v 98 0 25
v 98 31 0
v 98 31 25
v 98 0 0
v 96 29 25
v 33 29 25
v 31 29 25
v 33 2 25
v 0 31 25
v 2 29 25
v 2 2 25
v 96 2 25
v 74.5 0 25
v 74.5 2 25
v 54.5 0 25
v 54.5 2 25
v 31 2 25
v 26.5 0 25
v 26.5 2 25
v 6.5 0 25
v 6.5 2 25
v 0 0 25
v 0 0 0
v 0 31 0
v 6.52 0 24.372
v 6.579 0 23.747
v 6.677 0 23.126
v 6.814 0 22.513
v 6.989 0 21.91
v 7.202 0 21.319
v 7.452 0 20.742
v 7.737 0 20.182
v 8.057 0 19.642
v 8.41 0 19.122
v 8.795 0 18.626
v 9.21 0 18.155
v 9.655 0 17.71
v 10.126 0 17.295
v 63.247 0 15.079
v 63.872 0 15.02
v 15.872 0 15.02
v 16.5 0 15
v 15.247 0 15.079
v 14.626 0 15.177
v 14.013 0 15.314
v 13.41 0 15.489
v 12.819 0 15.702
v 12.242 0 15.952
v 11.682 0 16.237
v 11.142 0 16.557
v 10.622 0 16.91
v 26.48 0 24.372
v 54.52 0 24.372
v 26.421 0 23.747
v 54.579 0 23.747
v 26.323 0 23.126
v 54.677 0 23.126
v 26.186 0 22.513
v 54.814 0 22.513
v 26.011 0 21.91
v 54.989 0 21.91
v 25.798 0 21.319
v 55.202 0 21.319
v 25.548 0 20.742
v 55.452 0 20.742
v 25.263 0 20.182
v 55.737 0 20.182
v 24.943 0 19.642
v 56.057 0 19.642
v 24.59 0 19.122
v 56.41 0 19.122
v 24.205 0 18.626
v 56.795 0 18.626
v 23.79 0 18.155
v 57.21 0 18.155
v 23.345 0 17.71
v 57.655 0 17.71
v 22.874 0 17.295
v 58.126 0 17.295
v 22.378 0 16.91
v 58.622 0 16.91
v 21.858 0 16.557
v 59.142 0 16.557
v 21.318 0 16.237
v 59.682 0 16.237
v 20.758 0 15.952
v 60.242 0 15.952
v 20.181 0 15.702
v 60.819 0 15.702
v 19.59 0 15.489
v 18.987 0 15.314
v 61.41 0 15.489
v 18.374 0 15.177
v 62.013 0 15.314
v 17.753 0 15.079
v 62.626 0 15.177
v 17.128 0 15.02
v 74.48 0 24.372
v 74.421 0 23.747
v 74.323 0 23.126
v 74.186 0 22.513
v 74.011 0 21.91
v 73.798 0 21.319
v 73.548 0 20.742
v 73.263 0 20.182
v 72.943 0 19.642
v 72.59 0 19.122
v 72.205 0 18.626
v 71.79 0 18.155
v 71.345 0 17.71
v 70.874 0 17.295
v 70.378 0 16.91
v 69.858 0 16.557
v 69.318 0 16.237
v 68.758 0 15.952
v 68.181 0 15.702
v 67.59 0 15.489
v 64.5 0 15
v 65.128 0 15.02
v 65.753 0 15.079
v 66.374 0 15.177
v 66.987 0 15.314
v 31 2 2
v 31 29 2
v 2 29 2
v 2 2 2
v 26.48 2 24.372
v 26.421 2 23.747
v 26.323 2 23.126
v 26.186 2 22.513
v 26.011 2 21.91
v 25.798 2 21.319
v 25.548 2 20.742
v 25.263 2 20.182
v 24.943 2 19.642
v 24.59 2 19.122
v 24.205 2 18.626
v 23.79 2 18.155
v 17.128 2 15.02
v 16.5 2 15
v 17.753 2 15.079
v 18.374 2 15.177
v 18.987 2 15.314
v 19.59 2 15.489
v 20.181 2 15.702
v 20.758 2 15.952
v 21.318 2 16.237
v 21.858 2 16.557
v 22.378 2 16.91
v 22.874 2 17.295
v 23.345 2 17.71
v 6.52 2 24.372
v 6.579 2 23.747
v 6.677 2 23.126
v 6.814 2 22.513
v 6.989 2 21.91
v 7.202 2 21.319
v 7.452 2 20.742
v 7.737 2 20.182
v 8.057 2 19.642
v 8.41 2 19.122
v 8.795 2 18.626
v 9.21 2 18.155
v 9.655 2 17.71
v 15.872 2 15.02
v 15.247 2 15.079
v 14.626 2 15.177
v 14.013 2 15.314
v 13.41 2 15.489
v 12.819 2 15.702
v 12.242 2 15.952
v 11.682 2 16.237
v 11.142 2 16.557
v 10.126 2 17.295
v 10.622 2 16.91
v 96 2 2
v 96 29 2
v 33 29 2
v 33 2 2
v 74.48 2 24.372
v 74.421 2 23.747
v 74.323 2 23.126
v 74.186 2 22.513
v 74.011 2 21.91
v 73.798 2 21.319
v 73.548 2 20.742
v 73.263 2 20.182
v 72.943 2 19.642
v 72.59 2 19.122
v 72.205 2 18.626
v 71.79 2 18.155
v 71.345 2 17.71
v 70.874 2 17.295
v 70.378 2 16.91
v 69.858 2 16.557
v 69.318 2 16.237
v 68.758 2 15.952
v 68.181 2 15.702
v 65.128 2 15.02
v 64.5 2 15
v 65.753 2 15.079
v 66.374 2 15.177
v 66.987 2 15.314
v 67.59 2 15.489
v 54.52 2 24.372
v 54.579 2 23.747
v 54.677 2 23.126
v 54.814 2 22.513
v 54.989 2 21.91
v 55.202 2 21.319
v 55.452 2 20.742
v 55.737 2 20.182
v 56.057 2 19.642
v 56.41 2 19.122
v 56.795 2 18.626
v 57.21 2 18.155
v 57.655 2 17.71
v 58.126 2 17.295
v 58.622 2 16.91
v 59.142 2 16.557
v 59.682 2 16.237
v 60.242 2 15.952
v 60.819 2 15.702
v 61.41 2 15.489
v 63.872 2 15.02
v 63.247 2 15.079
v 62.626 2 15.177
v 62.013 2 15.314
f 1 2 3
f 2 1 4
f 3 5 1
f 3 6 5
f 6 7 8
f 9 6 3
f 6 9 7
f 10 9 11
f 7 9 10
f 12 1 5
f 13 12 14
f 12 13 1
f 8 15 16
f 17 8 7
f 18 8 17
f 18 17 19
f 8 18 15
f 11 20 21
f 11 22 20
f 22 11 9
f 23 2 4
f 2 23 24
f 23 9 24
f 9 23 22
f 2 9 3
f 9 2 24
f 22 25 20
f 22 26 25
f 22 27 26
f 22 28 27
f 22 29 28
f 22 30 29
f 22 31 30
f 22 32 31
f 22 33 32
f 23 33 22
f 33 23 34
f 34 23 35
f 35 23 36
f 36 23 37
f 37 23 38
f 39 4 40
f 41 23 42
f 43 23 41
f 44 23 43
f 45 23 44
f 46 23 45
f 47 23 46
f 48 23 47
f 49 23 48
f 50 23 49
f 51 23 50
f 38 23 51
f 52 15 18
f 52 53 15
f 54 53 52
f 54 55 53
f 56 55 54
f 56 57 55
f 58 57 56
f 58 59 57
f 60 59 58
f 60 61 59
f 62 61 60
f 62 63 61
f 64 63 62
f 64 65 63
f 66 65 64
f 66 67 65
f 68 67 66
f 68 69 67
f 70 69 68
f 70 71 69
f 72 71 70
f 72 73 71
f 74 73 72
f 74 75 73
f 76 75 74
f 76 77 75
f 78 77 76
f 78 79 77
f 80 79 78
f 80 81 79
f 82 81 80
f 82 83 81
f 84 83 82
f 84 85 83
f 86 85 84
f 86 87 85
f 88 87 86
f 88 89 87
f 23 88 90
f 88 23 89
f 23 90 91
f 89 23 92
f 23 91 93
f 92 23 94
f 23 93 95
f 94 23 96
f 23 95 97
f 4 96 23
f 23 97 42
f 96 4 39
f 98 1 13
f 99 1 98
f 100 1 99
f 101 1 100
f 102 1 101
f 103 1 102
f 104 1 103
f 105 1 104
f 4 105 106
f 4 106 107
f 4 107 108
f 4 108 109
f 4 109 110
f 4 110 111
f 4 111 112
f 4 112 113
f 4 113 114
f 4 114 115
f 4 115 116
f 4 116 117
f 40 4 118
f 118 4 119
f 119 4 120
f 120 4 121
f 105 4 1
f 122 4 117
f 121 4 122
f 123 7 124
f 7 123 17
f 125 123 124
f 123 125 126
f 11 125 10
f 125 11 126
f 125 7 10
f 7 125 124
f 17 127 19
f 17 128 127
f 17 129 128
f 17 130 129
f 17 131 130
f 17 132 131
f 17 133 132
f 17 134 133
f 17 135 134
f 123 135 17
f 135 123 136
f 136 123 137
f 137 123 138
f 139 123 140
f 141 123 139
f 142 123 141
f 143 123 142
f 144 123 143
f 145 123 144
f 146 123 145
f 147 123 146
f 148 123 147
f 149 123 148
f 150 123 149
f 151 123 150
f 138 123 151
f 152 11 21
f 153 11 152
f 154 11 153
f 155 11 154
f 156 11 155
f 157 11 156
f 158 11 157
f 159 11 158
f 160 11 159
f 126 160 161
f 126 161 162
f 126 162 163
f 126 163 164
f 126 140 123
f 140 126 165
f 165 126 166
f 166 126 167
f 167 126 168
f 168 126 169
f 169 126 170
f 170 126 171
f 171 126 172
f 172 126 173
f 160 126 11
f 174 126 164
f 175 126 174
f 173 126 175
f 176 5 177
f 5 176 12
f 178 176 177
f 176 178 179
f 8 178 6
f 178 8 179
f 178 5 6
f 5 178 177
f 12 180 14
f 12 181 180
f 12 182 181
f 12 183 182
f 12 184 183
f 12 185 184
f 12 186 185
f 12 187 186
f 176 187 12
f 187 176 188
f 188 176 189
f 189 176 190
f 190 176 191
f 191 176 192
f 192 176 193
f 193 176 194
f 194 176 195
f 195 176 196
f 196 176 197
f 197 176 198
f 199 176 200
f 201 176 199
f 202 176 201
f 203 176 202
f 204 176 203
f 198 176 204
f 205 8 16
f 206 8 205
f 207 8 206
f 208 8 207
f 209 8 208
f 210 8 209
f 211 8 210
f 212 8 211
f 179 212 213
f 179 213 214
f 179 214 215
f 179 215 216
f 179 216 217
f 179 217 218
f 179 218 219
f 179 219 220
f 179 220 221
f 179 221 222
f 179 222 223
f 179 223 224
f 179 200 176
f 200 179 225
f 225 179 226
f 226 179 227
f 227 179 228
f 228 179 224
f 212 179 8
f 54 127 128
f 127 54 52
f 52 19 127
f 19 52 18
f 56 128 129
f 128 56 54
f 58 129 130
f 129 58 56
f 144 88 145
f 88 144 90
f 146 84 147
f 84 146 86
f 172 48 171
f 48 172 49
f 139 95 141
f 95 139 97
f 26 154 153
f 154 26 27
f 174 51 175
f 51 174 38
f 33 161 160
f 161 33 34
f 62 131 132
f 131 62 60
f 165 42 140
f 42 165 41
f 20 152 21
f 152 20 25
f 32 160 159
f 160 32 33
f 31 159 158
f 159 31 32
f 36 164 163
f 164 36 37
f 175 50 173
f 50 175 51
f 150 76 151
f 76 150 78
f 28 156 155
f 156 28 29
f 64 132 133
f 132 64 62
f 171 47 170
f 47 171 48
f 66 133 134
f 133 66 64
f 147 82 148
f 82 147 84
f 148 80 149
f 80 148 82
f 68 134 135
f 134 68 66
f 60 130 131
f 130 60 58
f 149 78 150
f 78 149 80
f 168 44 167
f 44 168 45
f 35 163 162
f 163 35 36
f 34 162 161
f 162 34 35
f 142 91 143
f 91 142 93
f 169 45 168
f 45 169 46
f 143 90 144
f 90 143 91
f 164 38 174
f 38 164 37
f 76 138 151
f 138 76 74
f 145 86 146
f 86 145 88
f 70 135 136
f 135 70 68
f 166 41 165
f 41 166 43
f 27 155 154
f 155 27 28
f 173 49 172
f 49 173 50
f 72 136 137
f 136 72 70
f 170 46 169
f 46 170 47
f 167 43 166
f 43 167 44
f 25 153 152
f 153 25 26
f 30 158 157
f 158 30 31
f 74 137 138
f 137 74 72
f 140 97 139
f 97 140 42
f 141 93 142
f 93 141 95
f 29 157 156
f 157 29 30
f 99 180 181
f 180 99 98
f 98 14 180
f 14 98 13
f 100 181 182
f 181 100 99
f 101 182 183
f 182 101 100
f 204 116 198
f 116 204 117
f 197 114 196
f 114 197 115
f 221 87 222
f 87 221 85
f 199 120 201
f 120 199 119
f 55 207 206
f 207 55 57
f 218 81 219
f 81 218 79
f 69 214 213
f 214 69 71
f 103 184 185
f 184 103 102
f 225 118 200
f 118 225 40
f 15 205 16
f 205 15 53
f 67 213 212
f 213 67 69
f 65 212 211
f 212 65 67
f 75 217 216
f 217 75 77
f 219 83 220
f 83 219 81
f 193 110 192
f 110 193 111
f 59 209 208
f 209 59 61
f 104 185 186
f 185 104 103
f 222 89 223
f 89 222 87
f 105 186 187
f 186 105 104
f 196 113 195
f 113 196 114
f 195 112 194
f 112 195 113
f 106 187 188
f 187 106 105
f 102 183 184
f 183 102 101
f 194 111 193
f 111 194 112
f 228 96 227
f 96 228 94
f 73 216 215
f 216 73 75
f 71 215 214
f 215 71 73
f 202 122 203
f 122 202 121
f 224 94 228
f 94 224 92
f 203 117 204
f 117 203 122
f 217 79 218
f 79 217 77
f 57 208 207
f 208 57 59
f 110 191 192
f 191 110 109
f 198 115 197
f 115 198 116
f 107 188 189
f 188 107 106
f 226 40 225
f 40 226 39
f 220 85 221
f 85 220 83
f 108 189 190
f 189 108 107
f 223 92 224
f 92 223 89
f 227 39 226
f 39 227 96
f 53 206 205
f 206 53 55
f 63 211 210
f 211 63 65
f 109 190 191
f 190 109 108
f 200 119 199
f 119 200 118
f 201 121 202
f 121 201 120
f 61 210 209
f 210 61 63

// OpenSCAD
width = 98;
depth = 31;
height = 25;
thickness = 2;
finger_d = 20;
// define tolerance for creating hole size to avoid rendering issues
// try with tol=0 to see rendering issues
tol=0.001;

well_depth = depth - 2*thickness;
small_width = depth - thickness;
large_width = width - small_width - 3*thickness;

$fn = 100;

module hole(){
  // created a hole a bit thicker than the wall to avoid rendering issues
  // created on center so translation is for center
  rotate([-90,0,0])
  cylinder(d=finger_d, h=thickness+tol, center=true);
}

difference() {
  // Main body
  cube([width, depth, height]); 
  
  // Small well
  translate([thickness, thickness, thickness])
    cube([small_width, well_depth, height]);
  
  // Large well
  translate([depth+thickness, thickness, thickness])
    cube([large_width, well_depth, height]);
   
  // Small well finger cutout
  translate([thickness+small_width/2, thickness/2, height])
    hole();
  
  // Large well finger cutout
  translate([width-thickness-large_width/2, thickness/2, height])
    hole();
}
